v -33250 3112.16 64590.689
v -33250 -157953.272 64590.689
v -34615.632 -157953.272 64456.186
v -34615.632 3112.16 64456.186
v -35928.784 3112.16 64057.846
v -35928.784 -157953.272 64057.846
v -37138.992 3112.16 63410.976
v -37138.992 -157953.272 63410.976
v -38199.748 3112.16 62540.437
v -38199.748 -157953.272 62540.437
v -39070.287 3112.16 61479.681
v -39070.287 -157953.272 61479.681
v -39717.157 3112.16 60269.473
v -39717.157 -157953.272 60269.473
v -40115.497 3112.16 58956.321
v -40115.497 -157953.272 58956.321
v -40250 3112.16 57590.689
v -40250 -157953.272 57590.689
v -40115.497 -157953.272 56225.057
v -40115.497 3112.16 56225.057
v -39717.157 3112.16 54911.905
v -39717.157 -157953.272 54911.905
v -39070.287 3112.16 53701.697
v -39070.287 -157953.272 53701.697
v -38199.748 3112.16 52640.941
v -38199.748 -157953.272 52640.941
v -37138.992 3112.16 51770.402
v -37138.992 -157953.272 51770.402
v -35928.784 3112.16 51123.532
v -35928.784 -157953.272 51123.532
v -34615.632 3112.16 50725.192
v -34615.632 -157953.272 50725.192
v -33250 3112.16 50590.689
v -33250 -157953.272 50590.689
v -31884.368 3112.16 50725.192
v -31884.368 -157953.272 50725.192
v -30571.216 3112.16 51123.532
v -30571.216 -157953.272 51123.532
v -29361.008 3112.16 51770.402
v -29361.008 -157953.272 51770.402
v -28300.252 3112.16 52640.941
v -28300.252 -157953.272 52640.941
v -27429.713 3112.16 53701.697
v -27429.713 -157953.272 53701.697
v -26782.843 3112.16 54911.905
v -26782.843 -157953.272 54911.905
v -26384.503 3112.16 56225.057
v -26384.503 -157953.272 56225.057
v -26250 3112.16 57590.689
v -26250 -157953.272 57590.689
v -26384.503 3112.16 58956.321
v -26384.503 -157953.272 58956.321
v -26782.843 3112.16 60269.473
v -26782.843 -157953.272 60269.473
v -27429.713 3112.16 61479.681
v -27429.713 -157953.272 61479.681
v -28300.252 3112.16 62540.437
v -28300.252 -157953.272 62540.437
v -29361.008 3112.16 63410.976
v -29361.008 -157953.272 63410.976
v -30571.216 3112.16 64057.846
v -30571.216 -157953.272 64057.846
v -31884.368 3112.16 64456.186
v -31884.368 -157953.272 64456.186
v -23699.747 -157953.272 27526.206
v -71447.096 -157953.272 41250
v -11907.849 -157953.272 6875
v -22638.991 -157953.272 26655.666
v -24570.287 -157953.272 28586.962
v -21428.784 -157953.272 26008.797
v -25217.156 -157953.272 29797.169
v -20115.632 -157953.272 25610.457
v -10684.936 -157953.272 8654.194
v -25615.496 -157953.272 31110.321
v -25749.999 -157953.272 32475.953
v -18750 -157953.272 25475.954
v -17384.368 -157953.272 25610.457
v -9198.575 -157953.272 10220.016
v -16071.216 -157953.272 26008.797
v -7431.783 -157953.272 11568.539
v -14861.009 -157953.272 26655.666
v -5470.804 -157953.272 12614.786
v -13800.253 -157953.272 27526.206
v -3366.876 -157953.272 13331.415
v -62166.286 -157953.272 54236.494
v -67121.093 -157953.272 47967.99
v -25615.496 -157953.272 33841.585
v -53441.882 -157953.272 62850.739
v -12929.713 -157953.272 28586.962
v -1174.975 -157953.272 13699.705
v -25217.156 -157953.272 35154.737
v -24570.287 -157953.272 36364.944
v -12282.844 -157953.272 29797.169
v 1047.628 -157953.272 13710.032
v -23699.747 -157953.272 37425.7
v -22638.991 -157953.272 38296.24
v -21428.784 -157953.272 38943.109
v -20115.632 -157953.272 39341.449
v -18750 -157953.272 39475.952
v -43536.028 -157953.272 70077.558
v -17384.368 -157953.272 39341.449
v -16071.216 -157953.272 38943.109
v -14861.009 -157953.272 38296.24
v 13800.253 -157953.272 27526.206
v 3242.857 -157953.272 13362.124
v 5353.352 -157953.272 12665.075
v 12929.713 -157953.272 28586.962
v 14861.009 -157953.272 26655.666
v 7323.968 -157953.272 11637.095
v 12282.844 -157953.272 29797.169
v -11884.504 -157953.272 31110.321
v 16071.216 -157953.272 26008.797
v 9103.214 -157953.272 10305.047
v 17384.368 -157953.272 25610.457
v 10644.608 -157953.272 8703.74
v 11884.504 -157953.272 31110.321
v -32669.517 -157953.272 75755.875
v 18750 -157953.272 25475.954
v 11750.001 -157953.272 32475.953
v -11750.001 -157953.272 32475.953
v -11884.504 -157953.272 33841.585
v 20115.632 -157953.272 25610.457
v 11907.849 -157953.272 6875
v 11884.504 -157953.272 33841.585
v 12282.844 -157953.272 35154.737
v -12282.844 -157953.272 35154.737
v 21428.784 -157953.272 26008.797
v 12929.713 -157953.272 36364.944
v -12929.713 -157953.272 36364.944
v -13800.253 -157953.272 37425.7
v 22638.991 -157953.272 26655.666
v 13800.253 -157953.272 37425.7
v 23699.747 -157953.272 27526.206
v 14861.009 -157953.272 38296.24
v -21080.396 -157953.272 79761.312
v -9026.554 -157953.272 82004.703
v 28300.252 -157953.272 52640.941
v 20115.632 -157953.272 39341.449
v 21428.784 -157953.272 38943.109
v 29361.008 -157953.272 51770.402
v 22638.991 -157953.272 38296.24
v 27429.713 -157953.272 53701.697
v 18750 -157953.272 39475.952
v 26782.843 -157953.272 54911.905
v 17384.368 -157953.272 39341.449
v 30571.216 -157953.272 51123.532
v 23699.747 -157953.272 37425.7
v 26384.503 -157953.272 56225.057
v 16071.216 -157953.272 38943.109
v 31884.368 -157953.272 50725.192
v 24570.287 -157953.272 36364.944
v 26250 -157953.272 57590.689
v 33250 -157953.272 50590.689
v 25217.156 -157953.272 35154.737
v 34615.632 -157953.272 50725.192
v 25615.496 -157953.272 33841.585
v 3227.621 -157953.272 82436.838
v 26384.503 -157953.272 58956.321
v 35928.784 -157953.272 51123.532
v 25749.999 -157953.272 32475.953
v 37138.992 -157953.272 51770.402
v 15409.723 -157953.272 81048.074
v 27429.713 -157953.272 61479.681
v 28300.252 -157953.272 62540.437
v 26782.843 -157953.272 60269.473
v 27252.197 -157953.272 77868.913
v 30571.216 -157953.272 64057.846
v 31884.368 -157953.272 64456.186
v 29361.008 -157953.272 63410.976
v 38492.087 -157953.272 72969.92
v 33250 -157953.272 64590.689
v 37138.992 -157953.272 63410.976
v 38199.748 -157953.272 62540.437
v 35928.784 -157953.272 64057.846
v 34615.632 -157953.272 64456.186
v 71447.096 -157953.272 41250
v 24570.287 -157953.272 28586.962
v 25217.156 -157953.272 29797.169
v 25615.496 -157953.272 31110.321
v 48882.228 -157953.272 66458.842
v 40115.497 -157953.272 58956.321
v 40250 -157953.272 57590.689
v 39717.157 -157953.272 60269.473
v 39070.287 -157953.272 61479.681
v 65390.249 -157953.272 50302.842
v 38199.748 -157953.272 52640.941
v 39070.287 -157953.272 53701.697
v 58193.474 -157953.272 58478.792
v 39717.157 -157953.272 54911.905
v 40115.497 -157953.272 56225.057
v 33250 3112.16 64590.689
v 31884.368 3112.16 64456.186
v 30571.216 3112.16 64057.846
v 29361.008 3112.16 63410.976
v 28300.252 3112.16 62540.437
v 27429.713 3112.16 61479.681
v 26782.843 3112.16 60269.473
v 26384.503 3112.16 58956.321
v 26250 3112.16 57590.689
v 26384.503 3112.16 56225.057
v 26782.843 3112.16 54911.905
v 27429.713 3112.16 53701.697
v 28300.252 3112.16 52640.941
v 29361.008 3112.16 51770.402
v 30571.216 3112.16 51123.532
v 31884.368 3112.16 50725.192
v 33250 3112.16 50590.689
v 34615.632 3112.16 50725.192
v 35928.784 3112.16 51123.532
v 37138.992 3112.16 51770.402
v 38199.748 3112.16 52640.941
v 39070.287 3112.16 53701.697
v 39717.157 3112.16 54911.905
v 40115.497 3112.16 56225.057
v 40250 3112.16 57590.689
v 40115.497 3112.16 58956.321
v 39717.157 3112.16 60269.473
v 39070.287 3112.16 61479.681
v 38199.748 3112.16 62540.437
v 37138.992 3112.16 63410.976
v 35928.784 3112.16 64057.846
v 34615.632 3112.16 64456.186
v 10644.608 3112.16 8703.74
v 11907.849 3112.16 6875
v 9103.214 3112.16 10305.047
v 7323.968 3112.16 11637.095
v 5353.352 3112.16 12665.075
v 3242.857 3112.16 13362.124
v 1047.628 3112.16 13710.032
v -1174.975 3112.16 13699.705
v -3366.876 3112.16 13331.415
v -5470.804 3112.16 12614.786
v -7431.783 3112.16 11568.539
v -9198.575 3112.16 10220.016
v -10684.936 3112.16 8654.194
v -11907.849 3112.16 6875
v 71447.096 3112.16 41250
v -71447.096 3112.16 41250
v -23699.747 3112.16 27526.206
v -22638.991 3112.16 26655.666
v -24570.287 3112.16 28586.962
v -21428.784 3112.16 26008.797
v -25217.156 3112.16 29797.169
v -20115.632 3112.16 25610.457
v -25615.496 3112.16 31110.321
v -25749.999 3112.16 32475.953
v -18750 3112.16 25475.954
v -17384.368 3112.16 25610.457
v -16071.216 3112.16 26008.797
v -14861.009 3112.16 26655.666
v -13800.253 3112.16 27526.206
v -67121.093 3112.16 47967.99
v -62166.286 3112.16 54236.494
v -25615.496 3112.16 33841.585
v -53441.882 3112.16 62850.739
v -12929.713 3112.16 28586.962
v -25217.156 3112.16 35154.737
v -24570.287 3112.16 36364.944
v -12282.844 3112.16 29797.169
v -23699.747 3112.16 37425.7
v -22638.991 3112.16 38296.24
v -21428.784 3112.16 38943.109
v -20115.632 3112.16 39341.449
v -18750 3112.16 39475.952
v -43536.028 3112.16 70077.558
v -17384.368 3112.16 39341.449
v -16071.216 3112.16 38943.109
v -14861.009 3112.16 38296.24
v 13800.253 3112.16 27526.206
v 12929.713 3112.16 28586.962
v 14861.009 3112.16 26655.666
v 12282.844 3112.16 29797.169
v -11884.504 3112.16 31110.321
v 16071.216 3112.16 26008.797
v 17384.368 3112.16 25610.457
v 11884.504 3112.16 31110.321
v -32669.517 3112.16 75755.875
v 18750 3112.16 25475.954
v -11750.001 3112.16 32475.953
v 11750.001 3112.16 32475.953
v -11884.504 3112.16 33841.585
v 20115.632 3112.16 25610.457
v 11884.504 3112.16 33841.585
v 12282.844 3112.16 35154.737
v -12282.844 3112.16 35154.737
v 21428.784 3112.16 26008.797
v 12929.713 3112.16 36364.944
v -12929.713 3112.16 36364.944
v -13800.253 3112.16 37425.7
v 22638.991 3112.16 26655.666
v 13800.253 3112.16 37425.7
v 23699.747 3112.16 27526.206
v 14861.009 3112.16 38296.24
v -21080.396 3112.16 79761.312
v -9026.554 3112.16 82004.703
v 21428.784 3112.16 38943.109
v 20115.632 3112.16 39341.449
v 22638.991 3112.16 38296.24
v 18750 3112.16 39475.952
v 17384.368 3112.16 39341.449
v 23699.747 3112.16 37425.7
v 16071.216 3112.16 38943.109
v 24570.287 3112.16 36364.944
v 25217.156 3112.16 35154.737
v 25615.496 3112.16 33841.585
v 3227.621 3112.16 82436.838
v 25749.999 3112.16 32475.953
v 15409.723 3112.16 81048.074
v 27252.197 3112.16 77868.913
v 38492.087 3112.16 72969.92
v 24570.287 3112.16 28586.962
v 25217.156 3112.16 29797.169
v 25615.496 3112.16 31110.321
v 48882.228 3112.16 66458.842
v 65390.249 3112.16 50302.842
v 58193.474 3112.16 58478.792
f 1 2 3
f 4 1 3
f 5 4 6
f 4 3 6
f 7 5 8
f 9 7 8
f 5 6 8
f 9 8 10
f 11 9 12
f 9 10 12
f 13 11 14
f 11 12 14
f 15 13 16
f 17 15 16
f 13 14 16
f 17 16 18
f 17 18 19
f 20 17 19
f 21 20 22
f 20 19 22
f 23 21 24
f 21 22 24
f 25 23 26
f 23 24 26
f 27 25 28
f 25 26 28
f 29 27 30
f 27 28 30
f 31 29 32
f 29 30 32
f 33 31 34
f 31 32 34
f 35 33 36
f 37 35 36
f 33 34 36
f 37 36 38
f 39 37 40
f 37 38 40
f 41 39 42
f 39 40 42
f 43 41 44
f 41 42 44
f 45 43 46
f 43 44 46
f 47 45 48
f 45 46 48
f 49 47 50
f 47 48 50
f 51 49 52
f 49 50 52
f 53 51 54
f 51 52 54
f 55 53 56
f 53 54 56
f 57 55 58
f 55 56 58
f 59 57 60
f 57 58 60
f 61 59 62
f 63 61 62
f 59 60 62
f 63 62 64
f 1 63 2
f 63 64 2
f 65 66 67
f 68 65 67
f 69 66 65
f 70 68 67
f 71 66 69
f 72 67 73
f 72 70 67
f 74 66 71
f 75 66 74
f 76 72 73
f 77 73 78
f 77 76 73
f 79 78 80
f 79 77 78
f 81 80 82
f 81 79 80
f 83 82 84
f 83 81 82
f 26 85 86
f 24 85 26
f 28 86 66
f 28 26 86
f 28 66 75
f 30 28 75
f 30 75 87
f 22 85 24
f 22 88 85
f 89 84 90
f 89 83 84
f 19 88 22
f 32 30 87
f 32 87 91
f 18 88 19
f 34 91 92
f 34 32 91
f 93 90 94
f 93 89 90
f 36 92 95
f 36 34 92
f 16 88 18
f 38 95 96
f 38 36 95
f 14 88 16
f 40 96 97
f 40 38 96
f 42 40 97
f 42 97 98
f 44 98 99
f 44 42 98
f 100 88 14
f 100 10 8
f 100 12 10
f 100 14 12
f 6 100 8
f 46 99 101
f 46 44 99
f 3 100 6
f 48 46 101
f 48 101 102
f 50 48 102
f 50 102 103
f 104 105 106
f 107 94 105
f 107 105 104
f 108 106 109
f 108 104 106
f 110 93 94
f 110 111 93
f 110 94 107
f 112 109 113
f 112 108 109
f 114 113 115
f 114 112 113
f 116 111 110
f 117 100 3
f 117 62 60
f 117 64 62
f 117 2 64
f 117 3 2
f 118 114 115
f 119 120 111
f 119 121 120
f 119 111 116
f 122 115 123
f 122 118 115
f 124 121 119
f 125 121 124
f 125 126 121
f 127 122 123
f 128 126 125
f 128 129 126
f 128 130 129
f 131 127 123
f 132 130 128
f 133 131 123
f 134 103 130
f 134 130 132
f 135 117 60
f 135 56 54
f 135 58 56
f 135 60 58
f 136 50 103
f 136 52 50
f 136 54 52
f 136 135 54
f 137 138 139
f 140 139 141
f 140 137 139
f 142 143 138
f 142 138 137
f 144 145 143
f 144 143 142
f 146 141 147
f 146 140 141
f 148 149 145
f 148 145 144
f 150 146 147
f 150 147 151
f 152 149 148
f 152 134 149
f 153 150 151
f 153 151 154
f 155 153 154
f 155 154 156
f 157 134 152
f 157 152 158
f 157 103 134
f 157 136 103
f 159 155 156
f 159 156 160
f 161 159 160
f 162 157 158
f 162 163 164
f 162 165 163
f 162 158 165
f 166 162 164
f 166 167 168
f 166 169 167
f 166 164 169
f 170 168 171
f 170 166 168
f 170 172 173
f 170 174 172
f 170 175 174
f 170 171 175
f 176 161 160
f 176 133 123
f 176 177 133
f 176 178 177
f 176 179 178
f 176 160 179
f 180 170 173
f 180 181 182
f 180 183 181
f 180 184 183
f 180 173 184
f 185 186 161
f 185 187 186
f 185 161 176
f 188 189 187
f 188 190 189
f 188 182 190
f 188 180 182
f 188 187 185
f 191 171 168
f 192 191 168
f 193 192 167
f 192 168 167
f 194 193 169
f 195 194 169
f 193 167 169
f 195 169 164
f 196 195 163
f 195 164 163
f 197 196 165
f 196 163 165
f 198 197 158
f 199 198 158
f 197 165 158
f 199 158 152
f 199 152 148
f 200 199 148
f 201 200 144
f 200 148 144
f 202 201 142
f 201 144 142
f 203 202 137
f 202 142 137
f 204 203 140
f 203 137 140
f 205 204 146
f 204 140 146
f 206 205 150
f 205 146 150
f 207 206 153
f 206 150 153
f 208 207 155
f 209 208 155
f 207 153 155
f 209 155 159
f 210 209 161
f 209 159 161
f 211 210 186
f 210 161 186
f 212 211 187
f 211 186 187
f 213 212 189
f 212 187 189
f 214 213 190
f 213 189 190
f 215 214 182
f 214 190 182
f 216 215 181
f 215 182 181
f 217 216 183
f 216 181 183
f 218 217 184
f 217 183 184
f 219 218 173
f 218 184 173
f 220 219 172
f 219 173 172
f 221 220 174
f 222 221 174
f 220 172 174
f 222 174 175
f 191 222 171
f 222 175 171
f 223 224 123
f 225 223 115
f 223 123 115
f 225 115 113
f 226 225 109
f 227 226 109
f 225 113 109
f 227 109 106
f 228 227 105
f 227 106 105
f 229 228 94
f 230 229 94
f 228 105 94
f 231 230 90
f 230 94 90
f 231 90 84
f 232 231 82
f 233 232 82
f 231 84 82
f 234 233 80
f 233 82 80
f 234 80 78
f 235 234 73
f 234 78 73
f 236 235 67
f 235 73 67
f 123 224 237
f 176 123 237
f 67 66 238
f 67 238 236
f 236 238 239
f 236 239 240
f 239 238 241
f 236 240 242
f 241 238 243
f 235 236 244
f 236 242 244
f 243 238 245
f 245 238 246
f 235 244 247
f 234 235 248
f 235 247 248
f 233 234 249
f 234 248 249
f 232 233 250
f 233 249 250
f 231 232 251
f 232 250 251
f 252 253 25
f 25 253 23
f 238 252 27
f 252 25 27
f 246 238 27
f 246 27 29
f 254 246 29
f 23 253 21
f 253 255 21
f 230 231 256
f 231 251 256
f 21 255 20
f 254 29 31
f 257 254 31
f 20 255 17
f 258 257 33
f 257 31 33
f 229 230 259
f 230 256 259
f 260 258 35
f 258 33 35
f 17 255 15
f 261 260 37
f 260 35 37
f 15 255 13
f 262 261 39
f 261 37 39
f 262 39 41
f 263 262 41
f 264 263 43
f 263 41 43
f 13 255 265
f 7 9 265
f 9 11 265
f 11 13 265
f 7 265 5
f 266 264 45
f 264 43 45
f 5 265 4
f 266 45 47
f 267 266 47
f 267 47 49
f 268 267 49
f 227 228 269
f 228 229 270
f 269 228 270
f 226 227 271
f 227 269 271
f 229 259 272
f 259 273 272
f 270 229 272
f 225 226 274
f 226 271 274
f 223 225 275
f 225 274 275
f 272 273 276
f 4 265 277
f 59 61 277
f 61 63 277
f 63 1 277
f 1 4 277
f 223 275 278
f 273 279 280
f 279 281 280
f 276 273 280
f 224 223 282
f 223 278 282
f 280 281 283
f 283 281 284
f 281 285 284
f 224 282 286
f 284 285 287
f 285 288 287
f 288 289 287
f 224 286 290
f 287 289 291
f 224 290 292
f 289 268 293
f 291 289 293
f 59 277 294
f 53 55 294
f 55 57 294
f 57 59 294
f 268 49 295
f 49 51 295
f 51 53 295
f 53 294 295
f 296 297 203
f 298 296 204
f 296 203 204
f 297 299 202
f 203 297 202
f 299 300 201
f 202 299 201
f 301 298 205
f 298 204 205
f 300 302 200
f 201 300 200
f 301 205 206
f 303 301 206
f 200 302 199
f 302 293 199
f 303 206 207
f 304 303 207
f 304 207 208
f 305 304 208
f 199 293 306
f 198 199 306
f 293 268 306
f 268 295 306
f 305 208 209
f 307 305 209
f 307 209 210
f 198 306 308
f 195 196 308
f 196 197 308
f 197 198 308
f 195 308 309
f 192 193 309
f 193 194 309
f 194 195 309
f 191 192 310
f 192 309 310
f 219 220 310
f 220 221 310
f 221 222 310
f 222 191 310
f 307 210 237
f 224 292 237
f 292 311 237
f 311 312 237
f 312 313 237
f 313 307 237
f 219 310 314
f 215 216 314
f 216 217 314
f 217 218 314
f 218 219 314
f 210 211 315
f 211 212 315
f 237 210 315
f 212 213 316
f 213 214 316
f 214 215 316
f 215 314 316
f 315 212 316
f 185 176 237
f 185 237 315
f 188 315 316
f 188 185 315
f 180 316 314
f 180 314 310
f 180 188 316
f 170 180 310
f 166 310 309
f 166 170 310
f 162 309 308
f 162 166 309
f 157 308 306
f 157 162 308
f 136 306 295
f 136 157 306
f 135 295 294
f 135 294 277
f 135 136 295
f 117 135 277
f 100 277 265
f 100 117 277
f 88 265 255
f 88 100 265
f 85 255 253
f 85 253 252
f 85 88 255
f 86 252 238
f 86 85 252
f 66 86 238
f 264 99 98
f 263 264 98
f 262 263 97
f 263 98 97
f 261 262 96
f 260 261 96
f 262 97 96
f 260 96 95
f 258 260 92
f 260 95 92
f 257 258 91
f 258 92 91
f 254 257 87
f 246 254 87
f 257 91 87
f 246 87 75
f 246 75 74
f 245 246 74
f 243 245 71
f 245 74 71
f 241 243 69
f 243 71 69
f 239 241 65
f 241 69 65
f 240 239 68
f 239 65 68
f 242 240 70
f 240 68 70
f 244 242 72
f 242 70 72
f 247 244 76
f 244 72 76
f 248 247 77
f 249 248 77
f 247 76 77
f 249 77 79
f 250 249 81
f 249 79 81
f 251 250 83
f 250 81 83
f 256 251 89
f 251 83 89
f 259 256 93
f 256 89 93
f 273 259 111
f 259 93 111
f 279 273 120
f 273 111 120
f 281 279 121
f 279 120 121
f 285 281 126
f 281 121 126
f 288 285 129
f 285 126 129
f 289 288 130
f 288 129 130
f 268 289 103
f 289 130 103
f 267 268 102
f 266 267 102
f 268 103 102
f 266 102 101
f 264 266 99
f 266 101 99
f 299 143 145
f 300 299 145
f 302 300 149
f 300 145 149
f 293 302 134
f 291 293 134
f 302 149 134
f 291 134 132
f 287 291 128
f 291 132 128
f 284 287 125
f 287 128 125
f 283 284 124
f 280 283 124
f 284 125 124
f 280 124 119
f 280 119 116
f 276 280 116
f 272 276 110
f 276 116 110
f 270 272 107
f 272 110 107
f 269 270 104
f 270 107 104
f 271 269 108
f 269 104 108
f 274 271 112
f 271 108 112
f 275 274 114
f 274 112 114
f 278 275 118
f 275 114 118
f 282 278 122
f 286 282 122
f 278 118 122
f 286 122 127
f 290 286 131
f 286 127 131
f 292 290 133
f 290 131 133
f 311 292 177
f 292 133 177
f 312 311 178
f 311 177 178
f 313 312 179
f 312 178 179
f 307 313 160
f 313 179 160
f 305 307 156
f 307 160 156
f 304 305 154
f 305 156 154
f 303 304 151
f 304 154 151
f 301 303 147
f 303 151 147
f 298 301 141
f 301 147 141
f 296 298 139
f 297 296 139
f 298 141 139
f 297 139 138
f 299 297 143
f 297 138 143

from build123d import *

# Parameters (mm, degrees)
F_3DSKETCH3_R   = 7000.000150263
F_3DSKETCH3_R_2 = 6999.999284238
EXTRUDE2_DEPTH  = 161065.432


with BuildPart() as part:
    # 3DSketch3 → Extrude2 (new body)
    with BuildSketch(Plane(origin=(-71447.096, -157953.272, 41250), x_dir=(1, 0, 0), z_dir=(0, -1, 0))):
        with BuildLine():
            Line((0, 0), (59539.247, -34375))
            add(Edge.make_bspline(
                [(83354.945, -34375), (83254.8989917, -34206.550823565), (83054.807042075, -33869.652583461), (82727.639268767, -33381.150363429), (82381.425352971, -32906.121222224), (82014.81992767, -32446.574904402), (81629.022493785, -32003.045022411), (81224.59773215, -31576.422611552), (80802.319190872, -31167.467154384), (80362.950330838, -30776.929684835), (79907.295947271, -30405.522485184), (79436.187165688, -30053.925381594), (78950.485066754, -29722.779768258), (78451.077403004, -29412.688789506), (77938.874492313, -29124.222574052), (77414.81390024, -28857.905587985), (76879.852899393, -28614.223563373), (76334.966988152, -28393.625508921), (75781.153545009, -28196.50854725), (75219.422698436, -28023.238254496), (74650.801039393, -27874.128832613), (74076.327487331, -27749.452022579), (73497.051330368, -27649.435128763), (72914.030489352, -27574.263661225), (72328.330037419, -27524.072163585), (71741.019728517, -27498.953572469), (71153.172271483, -27498.953572469), (70565.861962581, -27524.072163585), (69980.161510648, -27574.263661225), (69397.140669632, -27649.435128763), (68817.864512669, -27749.452022579), (68243.390960607, -27874.128832613), (67674.769301564, -28023.238254496), (67113.038454991, -28196.50854725), (66559.225011848, -28393.625508921), (66014.339100607, -28614.223563373), (65479.37809976, -28857.905587985), (64955.317507687, -29124.222574052), (64443.114596996, -29412.688789506), (63943.706933246, -29722.779768258), (63458.004834312, -30053.925381594), (62986.896052729, -30405.522485184), (62531.241669163, -30776.929684835), (62091.872809128, -31167.467154384), (61669.59426785, -31576.422611552), (61265.169506215, -32003.045022411), (60879.37207233, -32446.574904402), (60512.766647029, -32906.121222224), (60166.552731233, -33381.150363429), (59839.384957925, -33869.652583461), (59639.2930083, -34206.550823565), (59539.247, -34375)],
                knots=[0, 0, 0, 0, 0.020408161, 0.040816309, 0.061224467, 0.081632664, 0.102040816, 0.122448986, 0.142857137, 0.163265315, 0.183673484, 0.204081629, 0.22448978, 0.24489795, 0.265306134, 0.285714297, 0.306122442, 0.326530617, 0.346938779, 0.36734695, 0.387755093, 0.408163267, 0.428571434, 0.448979581, 0.469387738, 0.489795921, 0.510204079, 0.530612262, 0.551020419, 0.571428566, 0.591836733, 0.612244907, 0.63265305, 0.653061221, 0.673469383, 0.693877558, 0.714285703, 0.734693866, 0.75510205, 0.77551022, 0.795918371, 0.816326516, 0.836734685, 0.857142863, 0.877551014, 0.897959184, 0.918367336, 0.938775533, 0.959183691, 0.979591839, 1, 1, 1, 1], degree=3))
            Line((83354.945, -34375), (142894.192, 0))
            add(Edge.make_bspline(
                [(142894.192, 0), (142293.916924852, 1010.695813468), (141093.366809055, 3032.087382318), (139130.350862086, 5963.096300934), (137053.070850452, 8813.272698756), (134853.440878433, 11570.551416727), (132538.659742276, 14231.731489293), (130112.105261846, 16791.461611393), (127578.437696539, 19245.19757436), (124942.225066217, 21588.422908126), (122208.296100084, 23816.862756002), (119381.644091761, 25926.448840338), (116467.431679275, 27913.325209541), (113470.98142843, 29773.862864992), (110397.768348819, 31504.664655511), (107253.405368344, 33102.56842666), (104043.635787814, 34564.652864499), (100774.324276087, 35888.251759134), (97451.440926608, 37070.942929143), (94081.056695991, 38110.570302926), (90669.327359854, 39005.230126746), (87222.485500045, 39753.290798711), (83746.827513855, 40353.386889113), (80248.701794922, 40804.419751654), (76734.498878298, 41105.567940775), (73210.637353857, 41256.27842661), (69683.554646143, 41256.27842661), (66159.693121702, 41105.567940775), (62645.490205078, 40804.419751654), (59147.364486145, 40353.386889113), (55671.706499955, 39753.290798711), (52224.864640146, 39005.230126746), (48813.135304009, 38110.570302926), (45442.751073392, 37070.942929143), (42119.867723913, 35888.251759134), (38850.556212186, 34564.652864499), (35640.786631656, 33102.56842666), (32496.423651181, 31504.664655511), (29423.21057157, 29773.862864992), (26426.760320725, 27913.325209541), (23512.547908239, 25926.448840338), (20685.895899916, 23816.862756002), (17951.966933783, 21588.422908126), (15315.754303461, 19245.19757436), (12782.086738154, 16791.461611393), (10355.532257724, 14231.731489293), (8040.751121567, 11570.551416727), (5841.121149548, 8813.272698756), (3763.841137914, 5963.096300934), (1800.825190945, 3032.087382318), (600.275075148, 1010.695813468), (0, 0)],
                knots=[0, 0, 0, 0, 0.020408163, 0.040816325, 0.061224492, 0.081632653, 0.102040814, 0.122448979, 0.142857141, 0.163265306, 0.183673472, 0.204081632, 0.224489799, 0.244897958, 0.265306124, 0.28571429, 0.306122451, 0.32653061, 0.346938775, 0.367346938, 0.387755104, 0.408163264, 0.428571428, 0.448979594, 0.469387756, 0.489795916, 0.510204084, 0.530612244, 0.551020406, 0.571428572, 0.591836736, 0.612244896, 0.632653062, 0.653061225, 0.67346939, 0.693877549, 0.71428571, 0.734693876, 0.755102042, 0.775510201, 0.795918368, 0.816326528, 0.836734694, 0.857142859, 0.877551021, 0.897959186, 0.918367347, 0.938775508, 0.959183675, 0.979591837, 1, 1, 1, 1], degree=3))
        make_face()
        with Locations(Location((104697.096, 16340.689, 0), (0, 0, 90))):
            Circle(F_3DSKETCH3_R, mode=Mode.SUBTRACT)
        with Locations(Location((90197.096, -8774.047, 0), (0, 0, 90))):
            Circle(F_3DSKETCH3_R_2, mode=Mode.SUBTRACT)
        with Locations(Location((52697.096, -8774.047, 0), (0, 0, 90))):
            Circle(F_3DSKETCH3_R_2, mode=Mode.SUBTRACT)
        with Locations(Location((38197.096, 16340.689, 0), (0, 0, 90))):
            Circle(F_3DSKETCH3_R, mode=Mode.SUBTRACT)
    extrude(amount=-EXTRUDE2_DEPTH)


solid = part.part
